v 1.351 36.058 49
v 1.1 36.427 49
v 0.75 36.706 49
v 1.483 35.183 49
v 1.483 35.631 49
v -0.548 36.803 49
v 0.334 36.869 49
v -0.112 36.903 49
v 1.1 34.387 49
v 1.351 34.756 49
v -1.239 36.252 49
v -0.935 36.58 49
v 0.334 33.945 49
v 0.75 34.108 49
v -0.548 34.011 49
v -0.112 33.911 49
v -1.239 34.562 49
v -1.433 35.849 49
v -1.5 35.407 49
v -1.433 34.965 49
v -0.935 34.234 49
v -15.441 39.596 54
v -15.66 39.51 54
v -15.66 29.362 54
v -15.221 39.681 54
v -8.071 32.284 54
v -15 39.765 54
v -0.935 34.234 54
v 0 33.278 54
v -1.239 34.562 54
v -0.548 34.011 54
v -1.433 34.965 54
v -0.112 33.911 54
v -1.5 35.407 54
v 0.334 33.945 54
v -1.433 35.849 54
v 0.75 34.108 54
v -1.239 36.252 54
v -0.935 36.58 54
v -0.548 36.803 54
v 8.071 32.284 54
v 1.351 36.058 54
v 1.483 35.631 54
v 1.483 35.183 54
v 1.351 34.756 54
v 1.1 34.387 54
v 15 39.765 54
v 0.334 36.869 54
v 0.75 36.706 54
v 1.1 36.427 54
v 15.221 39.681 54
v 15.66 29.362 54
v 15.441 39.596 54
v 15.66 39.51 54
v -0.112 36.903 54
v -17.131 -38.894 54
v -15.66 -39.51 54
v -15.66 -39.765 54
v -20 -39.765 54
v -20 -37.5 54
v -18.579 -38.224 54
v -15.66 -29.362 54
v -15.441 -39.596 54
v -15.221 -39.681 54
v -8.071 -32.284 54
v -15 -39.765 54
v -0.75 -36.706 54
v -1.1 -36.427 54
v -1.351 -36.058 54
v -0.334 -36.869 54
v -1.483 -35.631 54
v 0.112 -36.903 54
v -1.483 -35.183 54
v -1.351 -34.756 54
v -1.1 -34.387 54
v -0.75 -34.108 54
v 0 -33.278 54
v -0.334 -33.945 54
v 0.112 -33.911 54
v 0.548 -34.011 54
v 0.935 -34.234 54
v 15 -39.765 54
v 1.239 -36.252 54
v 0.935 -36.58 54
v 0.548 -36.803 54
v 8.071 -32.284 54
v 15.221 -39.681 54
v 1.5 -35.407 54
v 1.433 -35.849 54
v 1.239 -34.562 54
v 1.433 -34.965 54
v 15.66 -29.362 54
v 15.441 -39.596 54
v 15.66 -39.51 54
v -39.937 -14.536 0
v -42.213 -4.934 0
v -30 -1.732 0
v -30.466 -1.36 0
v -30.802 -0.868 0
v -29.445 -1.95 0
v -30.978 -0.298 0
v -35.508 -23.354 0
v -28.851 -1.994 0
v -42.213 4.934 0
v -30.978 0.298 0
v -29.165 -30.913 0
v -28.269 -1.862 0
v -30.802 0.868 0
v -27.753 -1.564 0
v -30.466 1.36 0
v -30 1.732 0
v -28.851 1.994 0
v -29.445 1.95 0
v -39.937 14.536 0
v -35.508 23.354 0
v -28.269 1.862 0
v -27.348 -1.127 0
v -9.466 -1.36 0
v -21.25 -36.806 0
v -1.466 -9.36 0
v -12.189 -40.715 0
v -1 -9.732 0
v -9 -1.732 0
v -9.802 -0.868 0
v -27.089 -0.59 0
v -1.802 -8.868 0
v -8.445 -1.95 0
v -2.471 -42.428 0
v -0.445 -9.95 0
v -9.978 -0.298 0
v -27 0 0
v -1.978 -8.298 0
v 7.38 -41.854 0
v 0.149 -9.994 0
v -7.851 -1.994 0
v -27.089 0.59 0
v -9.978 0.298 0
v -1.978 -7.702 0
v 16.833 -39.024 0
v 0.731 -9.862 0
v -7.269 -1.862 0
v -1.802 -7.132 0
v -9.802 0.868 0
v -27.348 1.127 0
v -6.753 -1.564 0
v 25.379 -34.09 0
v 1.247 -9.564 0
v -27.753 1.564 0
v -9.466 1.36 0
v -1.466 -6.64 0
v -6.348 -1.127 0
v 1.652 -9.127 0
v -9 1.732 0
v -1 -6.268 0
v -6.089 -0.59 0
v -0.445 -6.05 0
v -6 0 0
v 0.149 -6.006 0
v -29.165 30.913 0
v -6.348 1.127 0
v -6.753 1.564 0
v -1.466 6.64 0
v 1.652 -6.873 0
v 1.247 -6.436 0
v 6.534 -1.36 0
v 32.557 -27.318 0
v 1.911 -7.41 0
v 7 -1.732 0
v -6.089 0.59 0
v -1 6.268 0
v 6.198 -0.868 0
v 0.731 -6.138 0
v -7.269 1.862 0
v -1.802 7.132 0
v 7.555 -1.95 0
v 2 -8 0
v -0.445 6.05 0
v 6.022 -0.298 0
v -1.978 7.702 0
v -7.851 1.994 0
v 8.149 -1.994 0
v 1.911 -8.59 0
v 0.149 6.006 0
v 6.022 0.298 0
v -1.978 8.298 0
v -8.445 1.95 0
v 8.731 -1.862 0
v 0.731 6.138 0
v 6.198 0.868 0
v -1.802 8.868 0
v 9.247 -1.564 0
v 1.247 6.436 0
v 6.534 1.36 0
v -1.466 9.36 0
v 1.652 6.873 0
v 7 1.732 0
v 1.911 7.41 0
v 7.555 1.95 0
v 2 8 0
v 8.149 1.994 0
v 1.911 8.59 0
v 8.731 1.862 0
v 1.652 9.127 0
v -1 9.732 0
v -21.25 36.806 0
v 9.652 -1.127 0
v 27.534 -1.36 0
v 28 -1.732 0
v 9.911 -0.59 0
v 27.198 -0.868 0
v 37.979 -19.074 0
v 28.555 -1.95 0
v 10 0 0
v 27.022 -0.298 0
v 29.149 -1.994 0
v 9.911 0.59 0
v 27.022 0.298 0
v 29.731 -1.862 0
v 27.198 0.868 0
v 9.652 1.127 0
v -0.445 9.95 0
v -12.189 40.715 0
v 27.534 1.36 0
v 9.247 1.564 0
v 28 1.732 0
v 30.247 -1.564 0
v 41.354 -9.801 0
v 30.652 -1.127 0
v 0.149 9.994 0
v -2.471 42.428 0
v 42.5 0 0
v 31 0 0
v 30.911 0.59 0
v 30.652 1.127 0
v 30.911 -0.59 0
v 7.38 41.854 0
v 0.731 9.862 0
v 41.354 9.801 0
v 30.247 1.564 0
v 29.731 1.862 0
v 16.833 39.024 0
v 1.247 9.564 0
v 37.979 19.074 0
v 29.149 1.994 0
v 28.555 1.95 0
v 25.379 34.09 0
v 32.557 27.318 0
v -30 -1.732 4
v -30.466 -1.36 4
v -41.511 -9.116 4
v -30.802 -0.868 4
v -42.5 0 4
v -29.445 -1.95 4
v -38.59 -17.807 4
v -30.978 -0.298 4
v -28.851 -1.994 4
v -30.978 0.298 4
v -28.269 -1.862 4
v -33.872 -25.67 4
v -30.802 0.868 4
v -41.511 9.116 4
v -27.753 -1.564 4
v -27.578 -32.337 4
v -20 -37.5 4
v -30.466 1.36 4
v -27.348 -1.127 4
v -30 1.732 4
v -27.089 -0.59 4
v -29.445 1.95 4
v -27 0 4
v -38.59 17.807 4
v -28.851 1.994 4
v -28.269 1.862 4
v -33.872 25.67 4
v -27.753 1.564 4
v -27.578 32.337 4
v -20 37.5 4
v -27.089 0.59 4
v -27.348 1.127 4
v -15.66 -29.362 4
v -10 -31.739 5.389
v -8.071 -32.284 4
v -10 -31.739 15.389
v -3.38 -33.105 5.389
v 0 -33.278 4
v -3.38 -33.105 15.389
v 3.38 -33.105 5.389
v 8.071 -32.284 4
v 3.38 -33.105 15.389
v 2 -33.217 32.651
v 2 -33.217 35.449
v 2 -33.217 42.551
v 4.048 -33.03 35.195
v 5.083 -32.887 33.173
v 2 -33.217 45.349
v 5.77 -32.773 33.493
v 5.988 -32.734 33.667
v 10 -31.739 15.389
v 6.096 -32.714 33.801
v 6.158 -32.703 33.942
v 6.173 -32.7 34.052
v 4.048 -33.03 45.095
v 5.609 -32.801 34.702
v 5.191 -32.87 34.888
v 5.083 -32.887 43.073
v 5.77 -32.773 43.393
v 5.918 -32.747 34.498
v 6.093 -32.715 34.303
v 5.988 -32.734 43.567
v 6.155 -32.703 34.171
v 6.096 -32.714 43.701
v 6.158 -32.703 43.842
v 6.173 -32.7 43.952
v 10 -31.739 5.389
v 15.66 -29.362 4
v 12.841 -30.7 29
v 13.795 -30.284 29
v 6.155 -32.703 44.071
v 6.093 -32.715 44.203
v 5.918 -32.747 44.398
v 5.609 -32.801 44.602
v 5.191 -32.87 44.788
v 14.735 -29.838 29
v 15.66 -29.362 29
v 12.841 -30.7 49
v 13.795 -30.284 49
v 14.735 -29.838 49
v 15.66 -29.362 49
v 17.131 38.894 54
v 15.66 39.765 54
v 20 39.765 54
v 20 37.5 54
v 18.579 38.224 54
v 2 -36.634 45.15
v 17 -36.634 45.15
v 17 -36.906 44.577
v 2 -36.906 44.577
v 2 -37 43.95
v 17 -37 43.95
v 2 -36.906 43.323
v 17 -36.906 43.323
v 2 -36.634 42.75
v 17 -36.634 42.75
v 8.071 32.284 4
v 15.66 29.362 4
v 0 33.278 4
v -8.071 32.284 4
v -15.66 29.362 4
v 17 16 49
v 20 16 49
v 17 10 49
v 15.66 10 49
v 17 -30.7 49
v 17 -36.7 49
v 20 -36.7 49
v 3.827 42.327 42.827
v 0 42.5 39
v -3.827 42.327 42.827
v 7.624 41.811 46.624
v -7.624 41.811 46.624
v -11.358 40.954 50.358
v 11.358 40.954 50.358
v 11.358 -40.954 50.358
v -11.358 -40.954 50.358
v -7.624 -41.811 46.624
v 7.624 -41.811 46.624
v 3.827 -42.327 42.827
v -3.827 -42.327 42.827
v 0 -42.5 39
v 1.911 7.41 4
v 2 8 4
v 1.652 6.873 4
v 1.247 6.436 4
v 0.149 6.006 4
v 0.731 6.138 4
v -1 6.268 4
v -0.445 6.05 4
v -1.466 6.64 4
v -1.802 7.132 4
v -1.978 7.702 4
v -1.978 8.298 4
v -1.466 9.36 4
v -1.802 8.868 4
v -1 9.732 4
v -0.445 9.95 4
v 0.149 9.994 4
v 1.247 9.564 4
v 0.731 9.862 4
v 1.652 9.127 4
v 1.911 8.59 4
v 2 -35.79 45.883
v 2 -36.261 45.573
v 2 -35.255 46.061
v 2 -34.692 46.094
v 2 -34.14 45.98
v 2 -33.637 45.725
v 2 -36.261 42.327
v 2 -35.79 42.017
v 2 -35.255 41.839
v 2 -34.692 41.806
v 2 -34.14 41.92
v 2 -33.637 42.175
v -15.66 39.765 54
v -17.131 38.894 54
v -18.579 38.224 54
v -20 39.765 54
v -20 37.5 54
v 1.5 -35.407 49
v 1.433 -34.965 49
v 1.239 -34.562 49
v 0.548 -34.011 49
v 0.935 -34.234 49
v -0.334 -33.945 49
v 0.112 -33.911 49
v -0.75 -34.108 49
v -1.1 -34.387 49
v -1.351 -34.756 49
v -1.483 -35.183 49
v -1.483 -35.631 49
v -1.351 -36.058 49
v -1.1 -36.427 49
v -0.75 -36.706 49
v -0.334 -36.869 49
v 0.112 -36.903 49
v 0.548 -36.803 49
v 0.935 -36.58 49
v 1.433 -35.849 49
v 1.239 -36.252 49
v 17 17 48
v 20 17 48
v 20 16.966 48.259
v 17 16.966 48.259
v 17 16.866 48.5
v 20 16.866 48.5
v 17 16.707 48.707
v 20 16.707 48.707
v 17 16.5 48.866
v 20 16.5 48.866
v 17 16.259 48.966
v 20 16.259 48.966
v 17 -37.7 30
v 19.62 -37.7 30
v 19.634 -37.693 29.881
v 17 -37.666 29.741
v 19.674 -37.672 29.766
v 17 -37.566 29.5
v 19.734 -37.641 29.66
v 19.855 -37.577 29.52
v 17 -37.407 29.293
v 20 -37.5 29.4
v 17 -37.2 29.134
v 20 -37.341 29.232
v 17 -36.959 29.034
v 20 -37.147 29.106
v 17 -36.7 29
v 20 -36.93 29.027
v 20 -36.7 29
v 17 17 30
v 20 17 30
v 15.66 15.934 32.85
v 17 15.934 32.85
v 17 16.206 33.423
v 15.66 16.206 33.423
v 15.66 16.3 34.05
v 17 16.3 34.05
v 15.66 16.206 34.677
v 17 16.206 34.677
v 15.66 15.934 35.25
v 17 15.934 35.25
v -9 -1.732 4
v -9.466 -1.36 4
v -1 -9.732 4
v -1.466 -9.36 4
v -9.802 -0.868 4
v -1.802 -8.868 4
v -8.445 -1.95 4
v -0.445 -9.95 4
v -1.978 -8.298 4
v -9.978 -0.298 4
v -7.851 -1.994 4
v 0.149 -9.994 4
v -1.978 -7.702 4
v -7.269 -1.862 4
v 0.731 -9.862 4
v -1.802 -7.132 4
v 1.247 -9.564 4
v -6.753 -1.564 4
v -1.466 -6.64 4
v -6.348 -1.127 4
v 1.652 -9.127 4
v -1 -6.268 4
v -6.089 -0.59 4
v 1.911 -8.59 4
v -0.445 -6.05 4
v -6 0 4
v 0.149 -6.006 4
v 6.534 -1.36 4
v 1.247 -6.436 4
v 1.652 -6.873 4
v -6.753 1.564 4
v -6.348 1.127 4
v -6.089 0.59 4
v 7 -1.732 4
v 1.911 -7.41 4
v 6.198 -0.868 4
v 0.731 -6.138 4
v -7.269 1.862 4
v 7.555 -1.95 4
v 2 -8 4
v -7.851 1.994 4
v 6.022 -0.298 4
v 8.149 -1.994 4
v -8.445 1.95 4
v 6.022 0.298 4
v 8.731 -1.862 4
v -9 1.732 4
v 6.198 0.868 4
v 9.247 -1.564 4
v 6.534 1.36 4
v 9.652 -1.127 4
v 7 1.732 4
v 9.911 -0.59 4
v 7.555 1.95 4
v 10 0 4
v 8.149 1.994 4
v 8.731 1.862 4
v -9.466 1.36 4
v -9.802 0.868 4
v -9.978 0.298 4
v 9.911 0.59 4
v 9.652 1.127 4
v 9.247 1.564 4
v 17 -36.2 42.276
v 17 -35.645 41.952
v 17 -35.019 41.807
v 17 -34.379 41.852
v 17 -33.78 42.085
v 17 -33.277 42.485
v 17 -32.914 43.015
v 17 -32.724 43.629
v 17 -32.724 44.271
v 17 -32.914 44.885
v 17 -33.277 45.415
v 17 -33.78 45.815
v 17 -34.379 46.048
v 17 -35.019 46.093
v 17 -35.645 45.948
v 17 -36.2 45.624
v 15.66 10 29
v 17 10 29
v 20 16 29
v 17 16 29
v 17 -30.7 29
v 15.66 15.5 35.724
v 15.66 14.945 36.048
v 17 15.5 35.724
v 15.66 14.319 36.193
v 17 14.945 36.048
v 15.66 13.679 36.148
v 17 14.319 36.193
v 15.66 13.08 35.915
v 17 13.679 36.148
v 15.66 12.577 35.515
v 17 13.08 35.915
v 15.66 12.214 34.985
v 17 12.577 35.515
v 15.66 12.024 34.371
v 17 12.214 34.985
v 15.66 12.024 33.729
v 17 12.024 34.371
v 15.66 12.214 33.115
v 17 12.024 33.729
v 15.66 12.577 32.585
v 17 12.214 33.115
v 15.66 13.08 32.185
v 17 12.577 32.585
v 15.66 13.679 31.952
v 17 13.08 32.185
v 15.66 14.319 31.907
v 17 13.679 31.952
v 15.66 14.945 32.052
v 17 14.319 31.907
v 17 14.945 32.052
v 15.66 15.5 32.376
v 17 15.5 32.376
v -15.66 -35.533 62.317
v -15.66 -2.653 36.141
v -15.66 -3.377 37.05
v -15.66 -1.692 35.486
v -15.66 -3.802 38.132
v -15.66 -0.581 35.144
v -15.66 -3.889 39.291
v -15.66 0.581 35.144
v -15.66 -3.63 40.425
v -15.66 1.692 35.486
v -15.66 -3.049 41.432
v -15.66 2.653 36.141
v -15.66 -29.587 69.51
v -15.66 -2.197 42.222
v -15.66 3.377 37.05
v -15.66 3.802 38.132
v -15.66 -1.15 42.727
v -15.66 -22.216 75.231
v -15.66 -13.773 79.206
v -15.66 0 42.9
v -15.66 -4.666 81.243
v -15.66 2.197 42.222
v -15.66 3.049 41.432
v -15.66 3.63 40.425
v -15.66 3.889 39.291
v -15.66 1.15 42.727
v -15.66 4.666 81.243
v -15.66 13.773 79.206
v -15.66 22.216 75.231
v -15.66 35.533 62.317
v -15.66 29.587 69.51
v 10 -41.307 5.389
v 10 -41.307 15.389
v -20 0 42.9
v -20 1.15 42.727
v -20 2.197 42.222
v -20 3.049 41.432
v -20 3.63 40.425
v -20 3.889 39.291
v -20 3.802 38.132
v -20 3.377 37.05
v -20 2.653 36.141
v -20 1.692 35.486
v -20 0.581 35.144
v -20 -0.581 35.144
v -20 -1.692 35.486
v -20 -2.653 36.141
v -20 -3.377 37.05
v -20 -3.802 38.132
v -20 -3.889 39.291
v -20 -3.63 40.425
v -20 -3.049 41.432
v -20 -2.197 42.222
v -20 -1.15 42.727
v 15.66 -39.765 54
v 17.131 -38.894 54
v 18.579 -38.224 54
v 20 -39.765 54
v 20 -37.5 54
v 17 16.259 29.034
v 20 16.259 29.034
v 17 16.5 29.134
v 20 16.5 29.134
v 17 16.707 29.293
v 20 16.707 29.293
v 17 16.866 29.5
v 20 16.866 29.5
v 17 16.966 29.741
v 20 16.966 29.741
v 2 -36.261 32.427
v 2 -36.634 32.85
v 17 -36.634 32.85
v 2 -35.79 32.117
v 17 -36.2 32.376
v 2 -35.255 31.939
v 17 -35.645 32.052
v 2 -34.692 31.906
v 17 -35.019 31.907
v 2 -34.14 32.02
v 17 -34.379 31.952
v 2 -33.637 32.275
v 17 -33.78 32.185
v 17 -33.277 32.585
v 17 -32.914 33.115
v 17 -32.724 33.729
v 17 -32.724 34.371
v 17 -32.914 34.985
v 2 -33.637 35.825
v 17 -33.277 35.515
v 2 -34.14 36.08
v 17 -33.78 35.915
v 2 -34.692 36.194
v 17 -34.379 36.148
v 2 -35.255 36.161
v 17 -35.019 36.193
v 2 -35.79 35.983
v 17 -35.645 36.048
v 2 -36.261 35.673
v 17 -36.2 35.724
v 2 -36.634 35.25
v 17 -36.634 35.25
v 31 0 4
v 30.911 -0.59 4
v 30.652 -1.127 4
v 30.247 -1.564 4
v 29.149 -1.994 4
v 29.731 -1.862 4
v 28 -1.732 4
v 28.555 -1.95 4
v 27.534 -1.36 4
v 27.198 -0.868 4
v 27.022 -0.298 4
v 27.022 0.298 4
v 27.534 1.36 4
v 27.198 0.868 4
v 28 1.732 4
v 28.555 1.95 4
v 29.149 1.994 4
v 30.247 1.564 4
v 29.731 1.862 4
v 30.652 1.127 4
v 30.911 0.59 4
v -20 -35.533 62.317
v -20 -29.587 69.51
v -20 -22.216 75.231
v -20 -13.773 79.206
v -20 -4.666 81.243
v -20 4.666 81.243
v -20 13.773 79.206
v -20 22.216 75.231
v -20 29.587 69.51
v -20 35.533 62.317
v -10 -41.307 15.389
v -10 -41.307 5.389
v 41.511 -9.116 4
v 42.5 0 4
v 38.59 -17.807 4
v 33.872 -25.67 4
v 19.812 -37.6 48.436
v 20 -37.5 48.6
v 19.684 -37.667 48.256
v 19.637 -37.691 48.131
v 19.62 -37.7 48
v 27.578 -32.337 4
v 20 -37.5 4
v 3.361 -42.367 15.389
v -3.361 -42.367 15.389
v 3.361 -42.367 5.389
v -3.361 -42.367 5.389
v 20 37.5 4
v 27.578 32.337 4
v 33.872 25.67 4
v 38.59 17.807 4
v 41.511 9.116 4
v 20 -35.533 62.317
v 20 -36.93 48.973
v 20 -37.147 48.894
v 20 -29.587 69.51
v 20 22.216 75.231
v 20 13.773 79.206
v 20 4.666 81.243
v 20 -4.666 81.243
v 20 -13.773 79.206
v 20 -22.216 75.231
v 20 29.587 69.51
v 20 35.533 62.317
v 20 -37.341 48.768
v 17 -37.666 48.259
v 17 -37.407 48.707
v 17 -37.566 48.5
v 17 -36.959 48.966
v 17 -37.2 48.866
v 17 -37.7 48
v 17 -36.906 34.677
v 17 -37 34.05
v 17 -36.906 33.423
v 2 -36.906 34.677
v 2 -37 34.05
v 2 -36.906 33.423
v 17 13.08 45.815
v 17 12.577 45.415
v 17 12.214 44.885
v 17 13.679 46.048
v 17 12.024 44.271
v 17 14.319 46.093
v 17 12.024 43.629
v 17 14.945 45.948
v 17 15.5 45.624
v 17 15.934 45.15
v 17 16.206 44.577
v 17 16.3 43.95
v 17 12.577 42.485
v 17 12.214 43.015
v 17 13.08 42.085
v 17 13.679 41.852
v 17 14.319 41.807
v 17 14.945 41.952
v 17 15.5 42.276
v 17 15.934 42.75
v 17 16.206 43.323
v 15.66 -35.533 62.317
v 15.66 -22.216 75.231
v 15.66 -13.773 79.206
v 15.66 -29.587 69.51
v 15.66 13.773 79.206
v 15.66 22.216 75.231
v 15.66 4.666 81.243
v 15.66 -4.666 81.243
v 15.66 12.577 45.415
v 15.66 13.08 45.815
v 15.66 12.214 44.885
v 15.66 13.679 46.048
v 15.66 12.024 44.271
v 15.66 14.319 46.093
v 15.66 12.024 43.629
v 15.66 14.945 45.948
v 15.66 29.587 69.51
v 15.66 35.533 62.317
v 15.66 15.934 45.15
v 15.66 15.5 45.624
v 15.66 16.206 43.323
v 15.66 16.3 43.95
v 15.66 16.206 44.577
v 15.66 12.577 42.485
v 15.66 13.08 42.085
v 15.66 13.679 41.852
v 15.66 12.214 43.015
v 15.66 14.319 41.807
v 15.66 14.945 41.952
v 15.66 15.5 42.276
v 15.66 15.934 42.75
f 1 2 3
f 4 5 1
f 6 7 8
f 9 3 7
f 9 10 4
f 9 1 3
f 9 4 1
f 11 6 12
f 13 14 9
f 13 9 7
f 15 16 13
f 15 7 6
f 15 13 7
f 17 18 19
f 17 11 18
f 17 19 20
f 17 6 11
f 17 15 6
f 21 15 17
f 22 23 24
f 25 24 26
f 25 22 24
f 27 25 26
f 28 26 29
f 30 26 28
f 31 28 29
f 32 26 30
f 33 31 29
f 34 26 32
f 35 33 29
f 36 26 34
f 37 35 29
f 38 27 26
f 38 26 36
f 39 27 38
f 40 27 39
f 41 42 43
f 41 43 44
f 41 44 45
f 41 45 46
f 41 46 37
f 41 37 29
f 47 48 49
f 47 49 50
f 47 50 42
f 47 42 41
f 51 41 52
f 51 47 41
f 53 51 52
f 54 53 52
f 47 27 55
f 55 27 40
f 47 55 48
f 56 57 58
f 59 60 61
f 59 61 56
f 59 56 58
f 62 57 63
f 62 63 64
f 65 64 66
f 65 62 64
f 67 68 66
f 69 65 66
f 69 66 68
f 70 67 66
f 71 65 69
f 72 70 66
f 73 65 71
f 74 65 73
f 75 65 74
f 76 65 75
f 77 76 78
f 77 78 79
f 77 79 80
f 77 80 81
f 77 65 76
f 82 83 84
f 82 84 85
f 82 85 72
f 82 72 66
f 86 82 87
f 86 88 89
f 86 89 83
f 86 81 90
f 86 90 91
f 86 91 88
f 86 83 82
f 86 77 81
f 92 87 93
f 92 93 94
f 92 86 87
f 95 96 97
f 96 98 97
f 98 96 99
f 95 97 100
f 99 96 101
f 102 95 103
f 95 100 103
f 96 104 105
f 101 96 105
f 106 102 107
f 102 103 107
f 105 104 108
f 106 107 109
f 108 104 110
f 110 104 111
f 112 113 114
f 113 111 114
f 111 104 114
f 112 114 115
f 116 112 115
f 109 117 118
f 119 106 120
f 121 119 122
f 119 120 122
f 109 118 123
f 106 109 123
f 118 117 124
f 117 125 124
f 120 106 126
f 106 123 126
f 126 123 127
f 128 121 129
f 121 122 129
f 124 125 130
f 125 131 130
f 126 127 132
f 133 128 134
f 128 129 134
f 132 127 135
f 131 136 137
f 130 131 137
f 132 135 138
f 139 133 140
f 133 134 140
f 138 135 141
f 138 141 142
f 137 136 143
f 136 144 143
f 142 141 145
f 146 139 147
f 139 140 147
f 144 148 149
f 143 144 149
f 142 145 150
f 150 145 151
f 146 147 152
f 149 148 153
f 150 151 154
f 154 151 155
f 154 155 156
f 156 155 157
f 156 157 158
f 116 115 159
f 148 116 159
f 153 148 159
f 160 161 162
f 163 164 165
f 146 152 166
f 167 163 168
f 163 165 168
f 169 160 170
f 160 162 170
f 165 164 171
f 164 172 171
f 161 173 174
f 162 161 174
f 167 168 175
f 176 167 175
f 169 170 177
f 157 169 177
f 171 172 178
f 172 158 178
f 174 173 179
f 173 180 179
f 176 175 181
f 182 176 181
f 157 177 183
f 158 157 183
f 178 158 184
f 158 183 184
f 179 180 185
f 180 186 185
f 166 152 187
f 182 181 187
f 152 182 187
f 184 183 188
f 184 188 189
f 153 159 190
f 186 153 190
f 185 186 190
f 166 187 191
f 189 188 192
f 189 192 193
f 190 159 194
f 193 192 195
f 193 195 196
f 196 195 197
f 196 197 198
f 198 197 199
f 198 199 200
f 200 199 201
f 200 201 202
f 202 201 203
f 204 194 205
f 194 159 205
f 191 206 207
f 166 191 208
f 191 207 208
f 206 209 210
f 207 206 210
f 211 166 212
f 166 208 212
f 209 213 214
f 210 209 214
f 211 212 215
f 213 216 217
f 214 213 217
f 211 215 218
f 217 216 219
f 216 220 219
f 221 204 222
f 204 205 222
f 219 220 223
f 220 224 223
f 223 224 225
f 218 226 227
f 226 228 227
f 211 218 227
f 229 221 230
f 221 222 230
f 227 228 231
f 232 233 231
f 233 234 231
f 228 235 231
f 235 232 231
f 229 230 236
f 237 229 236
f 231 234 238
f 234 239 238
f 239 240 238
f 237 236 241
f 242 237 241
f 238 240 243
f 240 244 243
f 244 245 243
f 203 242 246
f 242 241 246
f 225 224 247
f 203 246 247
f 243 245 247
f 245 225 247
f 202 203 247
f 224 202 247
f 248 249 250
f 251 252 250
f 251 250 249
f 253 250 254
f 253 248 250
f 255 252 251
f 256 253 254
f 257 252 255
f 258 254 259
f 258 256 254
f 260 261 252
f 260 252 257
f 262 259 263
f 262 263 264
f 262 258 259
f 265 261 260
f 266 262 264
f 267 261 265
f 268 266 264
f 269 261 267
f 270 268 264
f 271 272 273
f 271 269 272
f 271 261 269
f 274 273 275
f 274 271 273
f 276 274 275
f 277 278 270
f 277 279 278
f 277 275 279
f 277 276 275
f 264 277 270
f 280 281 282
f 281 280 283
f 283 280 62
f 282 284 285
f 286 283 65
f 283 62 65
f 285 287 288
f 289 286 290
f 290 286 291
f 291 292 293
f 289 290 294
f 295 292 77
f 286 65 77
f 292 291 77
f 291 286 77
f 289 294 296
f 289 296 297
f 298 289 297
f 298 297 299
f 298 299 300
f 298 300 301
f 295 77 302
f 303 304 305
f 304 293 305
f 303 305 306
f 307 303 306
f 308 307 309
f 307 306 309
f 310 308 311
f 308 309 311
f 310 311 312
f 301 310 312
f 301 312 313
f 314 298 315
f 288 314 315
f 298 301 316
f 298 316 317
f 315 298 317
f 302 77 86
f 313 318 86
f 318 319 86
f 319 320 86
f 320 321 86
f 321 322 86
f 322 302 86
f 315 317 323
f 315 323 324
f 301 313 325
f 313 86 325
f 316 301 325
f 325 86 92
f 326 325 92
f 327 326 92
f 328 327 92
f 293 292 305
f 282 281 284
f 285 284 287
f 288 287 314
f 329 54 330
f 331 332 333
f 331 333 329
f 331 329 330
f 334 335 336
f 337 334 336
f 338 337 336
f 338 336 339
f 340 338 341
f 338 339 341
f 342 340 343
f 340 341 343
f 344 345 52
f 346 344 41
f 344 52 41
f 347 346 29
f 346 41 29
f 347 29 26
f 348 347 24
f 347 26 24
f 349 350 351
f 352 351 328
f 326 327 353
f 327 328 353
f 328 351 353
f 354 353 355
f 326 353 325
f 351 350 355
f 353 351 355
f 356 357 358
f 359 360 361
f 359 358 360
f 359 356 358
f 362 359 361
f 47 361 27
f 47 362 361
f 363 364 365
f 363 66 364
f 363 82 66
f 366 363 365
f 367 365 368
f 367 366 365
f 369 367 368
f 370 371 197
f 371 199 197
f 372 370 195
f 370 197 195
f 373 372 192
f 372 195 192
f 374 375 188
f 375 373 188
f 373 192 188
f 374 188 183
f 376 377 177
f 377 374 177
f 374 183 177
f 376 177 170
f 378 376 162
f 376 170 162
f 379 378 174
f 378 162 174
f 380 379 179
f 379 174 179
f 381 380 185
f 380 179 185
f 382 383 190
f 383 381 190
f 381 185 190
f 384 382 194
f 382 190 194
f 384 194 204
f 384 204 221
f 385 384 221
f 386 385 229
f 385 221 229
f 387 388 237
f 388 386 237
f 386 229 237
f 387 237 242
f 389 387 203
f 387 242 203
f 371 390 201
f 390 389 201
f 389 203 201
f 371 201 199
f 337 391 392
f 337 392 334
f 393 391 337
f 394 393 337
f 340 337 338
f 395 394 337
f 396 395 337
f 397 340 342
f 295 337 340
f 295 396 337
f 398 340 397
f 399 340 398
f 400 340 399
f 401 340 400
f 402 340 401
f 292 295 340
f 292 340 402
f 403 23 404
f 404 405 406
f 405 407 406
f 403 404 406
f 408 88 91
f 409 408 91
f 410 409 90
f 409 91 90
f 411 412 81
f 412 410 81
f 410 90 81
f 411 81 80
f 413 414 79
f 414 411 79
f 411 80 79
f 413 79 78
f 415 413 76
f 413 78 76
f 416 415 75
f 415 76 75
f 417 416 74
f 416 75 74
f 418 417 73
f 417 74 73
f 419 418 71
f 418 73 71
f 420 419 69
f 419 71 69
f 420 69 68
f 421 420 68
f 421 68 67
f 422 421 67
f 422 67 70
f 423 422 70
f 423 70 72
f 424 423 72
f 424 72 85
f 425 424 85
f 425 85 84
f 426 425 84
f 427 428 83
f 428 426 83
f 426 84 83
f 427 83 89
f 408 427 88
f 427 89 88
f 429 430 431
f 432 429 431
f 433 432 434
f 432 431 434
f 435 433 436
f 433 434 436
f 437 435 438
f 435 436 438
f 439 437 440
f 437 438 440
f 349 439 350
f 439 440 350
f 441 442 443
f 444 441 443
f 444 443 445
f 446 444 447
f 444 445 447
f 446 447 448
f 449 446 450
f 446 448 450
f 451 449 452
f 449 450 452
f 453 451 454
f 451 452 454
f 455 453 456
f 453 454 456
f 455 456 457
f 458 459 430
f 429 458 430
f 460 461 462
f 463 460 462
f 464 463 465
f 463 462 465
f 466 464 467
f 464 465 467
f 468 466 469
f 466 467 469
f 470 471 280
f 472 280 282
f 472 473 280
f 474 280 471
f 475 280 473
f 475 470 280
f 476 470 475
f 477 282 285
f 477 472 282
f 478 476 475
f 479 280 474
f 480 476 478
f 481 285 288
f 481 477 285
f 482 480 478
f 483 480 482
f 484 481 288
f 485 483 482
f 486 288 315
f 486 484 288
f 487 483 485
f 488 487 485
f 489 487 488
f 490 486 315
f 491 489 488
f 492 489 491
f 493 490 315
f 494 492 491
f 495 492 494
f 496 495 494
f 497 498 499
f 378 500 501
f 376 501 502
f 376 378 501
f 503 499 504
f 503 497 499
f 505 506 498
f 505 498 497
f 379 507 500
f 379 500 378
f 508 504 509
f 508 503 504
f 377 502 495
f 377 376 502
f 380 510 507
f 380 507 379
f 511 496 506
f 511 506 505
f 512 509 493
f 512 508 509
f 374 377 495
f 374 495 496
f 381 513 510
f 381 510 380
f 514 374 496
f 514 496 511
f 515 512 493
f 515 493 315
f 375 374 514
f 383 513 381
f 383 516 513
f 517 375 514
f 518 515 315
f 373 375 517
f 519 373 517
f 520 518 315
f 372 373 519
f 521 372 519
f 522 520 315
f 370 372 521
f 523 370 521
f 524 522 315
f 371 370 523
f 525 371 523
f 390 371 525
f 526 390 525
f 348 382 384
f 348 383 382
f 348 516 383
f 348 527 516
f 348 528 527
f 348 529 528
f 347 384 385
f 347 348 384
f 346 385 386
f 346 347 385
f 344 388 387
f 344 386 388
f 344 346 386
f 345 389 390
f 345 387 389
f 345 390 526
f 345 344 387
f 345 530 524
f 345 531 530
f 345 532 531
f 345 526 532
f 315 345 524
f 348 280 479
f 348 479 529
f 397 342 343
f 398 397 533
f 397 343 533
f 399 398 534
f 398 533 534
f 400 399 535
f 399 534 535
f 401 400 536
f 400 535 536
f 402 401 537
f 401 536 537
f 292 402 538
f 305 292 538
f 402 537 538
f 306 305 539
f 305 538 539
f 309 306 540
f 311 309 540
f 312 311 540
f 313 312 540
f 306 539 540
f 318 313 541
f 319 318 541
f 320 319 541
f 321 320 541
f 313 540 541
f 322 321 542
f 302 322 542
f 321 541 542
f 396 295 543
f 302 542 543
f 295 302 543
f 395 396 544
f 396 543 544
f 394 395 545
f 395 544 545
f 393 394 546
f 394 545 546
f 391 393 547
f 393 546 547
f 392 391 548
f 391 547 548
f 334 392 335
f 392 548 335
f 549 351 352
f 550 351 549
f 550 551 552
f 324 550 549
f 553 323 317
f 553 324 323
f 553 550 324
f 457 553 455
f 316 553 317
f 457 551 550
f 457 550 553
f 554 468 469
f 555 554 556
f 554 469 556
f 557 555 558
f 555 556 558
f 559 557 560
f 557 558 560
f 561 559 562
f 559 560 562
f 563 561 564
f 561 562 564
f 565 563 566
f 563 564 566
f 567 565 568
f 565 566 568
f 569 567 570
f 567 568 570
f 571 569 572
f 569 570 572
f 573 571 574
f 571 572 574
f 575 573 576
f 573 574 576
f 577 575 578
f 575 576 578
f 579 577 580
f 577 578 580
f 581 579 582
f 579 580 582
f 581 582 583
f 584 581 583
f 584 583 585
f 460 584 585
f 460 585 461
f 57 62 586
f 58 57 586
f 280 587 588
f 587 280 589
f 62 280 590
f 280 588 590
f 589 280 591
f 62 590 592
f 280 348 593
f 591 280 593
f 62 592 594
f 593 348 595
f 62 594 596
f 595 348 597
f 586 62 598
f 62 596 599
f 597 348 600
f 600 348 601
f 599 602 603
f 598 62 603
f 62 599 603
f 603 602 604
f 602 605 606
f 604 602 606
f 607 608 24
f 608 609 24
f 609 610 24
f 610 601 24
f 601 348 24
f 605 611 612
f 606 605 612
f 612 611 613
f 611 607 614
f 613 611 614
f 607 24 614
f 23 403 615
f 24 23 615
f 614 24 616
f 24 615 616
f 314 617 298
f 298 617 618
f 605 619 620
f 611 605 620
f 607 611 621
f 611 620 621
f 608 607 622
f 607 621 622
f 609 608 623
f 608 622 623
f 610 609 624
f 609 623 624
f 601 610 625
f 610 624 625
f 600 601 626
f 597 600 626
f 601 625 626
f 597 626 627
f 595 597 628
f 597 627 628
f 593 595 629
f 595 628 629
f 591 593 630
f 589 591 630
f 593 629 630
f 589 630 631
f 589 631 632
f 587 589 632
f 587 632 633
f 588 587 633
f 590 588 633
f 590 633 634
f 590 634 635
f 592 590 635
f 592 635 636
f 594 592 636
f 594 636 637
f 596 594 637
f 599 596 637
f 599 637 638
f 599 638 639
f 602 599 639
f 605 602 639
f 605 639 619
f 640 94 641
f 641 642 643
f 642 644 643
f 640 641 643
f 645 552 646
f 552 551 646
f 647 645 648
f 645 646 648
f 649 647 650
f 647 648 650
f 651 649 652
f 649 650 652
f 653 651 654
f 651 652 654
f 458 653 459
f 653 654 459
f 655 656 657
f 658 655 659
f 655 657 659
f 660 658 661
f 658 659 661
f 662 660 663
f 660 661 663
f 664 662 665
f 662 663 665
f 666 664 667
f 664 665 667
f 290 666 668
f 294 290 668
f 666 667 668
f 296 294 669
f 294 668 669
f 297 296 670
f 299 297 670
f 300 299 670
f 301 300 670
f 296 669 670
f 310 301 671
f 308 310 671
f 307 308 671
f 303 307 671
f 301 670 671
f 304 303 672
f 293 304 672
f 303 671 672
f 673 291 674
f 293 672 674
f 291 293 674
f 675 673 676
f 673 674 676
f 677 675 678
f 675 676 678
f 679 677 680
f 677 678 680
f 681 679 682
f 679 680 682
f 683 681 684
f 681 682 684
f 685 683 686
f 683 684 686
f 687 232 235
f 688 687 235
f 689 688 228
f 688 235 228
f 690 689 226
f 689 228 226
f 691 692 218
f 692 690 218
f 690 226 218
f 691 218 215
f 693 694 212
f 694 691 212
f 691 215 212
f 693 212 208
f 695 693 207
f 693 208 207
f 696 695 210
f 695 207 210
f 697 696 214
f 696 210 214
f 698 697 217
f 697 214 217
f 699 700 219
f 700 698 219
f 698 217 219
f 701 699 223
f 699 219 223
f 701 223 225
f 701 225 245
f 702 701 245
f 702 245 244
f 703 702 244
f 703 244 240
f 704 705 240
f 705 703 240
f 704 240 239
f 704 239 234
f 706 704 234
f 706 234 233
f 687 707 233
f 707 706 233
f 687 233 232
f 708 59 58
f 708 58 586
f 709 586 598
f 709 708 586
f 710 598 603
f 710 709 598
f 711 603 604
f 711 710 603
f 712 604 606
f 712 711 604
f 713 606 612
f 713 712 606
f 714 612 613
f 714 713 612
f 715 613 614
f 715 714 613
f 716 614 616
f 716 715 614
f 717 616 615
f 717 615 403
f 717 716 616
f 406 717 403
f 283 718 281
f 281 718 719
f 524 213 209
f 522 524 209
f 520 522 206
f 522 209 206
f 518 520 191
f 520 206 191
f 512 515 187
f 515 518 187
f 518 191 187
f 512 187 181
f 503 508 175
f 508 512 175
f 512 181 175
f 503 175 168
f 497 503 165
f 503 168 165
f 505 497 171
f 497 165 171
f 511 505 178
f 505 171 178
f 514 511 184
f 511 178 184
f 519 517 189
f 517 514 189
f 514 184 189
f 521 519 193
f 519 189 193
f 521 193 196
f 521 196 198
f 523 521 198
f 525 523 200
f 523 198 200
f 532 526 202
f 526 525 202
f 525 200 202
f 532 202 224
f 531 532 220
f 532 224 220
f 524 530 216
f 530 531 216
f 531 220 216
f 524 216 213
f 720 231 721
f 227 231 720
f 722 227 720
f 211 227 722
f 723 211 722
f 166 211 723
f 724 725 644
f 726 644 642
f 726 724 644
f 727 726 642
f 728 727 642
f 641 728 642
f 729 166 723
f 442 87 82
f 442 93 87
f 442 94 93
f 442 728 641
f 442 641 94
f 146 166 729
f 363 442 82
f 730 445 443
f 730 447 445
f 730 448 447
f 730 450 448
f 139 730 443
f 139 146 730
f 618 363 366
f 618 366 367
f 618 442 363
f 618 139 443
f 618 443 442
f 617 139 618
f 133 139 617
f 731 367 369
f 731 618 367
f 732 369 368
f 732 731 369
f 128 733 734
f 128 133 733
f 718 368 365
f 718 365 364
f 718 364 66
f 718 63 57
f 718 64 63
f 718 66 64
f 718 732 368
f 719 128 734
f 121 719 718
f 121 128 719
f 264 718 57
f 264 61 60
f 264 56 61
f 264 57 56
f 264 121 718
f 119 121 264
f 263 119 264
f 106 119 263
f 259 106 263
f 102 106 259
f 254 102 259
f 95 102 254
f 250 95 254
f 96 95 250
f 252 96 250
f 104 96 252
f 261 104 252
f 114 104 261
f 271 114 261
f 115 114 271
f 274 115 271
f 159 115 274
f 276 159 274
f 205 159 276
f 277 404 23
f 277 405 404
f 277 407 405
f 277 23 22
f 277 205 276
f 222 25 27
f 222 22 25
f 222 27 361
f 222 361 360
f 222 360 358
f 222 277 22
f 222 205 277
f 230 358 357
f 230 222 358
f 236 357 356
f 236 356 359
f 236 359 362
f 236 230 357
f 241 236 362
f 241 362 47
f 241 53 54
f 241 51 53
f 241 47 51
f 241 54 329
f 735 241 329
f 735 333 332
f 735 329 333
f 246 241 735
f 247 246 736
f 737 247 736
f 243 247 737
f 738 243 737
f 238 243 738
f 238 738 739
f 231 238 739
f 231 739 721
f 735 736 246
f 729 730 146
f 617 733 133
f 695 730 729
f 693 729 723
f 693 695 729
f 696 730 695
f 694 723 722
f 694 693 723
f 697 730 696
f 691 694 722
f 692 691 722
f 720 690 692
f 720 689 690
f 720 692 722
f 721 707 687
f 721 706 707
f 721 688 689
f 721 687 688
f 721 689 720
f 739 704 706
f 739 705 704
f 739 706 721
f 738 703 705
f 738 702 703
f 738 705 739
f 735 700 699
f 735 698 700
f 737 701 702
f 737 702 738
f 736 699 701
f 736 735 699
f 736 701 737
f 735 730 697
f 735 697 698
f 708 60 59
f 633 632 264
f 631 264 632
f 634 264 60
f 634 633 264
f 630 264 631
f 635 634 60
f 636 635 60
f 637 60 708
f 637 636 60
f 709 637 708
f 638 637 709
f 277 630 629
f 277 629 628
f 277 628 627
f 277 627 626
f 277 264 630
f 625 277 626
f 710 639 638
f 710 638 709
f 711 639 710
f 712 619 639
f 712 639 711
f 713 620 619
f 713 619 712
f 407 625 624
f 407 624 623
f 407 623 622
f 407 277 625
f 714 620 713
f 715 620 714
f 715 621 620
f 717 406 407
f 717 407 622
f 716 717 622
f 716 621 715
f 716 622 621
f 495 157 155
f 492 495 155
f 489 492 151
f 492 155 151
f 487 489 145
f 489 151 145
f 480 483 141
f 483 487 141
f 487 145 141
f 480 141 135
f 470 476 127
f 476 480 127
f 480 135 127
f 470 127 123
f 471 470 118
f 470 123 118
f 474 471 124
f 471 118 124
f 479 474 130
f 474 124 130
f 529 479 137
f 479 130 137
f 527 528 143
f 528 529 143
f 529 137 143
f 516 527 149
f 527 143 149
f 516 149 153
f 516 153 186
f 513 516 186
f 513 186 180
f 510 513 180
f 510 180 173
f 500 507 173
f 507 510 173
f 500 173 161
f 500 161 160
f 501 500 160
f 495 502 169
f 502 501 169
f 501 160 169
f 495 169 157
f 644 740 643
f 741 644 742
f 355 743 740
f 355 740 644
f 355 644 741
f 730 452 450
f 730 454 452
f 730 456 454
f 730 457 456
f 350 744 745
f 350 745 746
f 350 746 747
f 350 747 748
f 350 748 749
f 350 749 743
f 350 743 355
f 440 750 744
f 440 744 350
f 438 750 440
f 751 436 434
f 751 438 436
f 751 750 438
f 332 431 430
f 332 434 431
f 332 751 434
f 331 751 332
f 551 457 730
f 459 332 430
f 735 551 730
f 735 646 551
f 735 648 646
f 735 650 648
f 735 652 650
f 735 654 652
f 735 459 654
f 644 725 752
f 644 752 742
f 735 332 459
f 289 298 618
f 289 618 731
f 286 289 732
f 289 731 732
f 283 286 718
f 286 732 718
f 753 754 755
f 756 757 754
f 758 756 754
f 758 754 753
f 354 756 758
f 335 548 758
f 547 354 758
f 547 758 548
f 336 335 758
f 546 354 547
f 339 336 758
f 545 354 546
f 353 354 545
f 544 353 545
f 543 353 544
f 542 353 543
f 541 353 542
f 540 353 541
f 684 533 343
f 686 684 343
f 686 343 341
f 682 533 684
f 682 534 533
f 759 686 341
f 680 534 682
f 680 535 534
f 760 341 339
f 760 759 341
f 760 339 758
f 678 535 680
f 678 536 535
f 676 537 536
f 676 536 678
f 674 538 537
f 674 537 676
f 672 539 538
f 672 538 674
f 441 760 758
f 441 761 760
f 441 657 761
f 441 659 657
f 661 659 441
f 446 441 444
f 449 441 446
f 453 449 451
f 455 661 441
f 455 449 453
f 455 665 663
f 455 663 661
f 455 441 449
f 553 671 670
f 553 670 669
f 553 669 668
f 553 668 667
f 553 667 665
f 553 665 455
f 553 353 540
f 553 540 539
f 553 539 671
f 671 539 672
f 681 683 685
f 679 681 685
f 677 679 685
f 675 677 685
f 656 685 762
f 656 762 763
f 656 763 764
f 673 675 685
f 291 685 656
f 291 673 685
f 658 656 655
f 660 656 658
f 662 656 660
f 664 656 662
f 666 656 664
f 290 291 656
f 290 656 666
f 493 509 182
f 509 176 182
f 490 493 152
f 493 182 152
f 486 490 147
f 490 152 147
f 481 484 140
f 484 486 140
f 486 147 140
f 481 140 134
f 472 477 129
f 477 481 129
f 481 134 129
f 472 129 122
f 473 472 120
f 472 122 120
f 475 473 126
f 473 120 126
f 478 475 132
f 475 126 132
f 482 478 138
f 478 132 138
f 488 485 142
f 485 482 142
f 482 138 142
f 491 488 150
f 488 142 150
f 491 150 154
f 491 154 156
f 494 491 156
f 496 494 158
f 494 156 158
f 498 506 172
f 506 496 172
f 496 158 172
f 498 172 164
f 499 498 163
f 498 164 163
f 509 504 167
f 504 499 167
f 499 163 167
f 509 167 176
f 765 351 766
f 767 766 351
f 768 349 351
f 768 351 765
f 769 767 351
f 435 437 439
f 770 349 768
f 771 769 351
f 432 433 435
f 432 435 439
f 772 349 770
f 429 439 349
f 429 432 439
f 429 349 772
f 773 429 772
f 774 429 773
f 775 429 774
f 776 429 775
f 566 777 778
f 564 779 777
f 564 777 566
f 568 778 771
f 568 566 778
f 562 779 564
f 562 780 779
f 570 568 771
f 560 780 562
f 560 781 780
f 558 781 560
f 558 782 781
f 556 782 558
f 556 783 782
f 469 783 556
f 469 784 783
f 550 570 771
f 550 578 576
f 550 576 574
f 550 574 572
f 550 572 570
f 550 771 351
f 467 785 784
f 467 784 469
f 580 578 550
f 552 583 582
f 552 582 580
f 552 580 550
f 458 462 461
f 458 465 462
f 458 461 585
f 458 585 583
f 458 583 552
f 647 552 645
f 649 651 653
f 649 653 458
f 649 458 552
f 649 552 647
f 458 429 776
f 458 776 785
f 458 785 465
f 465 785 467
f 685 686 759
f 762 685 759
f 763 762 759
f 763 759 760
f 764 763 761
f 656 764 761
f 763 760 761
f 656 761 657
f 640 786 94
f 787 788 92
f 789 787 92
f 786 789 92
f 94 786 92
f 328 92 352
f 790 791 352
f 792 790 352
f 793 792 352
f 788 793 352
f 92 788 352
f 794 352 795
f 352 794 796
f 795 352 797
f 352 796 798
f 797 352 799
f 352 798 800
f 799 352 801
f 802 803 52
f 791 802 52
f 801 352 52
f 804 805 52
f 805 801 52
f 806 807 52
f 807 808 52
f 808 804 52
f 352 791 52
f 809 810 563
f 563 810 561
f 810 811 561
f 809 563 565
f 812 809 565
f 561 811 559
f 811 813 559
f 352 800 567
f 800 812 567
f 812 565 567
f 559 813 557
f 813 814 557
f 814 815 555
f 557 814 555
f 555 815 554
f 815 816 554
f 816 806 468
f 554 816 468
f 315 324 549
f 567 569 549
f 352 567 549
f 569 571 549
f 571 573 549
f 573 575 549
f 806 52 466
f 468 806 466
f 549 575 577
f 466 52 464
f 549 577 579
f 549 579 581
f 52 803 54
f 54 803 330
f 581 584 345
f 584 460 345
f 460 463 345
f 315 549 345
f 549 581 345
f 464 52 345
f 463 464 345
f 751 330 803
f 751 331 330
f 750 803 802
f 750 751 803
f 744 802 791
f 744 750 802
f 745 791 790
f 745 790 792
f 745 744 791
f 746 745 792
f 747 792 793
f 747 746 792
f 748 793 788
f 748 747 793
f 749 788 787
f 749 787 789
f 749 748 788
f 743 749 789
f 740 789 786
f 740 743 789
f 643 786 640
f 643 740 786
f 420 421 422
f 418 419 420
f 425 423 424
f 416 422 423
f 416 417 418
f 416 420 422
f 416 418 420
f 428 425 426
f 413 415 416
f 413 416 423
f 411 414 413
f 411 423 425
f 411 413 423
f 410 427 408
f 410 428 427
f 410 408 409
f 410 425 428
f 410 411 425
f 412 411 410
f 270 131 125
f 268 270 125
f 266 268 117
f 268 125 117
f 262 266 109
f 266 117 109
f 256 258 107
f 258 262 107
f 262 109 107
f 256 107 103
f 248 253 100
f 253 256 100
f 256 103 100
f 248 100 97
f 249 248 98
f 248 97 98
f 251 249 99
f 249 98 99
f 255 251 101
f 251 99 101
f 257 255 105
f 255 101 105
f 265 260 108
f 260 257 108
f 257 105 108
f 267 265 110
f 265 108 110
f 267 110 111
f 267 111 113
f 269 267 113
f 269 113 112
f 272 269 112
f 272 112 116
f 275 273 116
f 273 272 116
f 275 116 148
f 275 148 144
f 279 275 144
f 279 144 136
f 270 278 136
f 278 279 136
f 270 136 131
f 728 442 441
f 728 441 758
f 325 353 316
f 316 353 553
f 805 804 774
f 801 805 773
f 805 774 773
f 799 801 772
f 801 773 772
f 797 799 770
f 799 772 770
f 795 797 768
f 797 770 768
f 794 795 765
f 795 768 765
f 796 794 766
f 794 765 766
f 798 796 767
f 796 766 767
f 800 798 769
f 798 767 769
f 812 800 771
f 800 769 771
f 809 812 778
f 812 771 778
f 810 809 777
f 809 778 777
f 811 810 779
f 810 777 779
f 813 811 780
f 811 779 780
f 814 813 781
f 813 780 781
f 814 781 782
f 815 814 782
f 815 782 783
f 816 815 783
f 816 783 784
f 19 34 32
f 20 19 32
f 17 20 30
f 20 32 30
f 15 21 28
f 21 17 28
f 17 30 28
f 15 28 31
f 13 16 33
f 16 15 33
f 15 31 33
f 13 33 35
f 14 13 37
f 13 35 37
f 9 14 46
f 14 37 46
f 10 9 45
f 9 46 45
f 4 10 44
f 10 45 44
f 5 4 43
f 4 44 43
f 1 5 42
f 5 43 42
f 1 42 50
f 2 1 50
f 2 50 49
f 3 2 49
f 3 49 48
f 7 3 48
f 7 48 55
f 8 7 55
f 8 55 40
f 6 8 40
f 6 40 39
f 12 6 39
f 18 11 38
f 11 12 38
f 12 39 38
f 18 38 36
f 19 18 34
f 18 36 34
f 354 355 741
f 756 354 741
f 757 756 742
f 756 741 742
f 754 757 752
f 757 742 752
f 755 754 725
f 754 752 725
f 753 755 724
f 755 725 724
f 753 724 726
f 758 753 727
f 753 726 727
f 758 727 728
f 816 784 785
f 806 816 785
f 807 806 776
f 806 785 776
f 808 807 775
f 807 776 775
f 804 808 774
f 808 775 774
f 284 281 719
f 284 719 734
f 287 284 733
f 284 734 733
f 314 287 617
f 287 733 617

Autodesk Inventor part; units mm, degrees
ref_plane "YZ Plane" through (0, 0, 0) normal (1, 0, 0) x (0, 1, 0)
ref_plane "XZ Plane" through (0, 0, 0) normal (0, 1, 0) x (-1, 0, 0)
sketch "Эскиз1" plane through (0, 0, 0) normal (0, 0, 1) x (1, 0, 0)
  circle A0 centre (29, 0) radius 2
  circle A1 centre (-29, 0) radius 2
  circle A2 centre (0, 8) radius 2
  circle A3 centre (8, 0) radius 2
  circle A4 centre (0, -8) radius 2
  circle A5 centre (-8, 0) radius 2
  circle A6 centre (0, 0) radius 42.5
  circle A7 centre (29, 0) radius 2
  circle A8 centre (-29, 0) radius 2
  circle A9 centre (0, 8) radius 2
  circle A10 centre (8, 0) radius 2
  circle A11 centre (0, -8) radius 2
  circle A12 centre (-8, 0) radius 2
  circle A13 centre (0, 0) radius 42.5
extrude "Выдавливание1" add sketch "Эскиз1" along normal blind 4
sketch "Эскиз16" plane through (0, 0, 4) normal (0, 0, 1) x (1, 0, 0)
  line L0 (-20, -37.5) -> (-20, 37.5)
  line L1 (20, 37.5) -> (20, -37.5)
  line L2 (20, -42.5) -> (-20, 42.5) construction
  line L3 (-20, -42.5) -> (20, 42.5) construction
  circle A0 centre (0, 0) radius 42.5 projected
  arc A1 (-20, -37.5) -> (20, -37.5) centre (0, 0) ccw
  arc A2 (20, 37.5) -> (-20, 37.5) centre (0, 0) ccw
extrude "Выдавливание14" add sketch "Эскиз16" along normal blind 50 contours L0 A0 L1
sketch "Эскиз17" plane through (0, 0, 54) normal (0, 0, 1) x (1, 0, 0)
  line L0 (-15.66, -29.3625) -> (-15.66, 29.3625)
  line L1 (15.66, 29.3625) -> (15.66, -29.3625)
  line L2 (15.66, -33.2775) -> (-15.66, 33.2775) construction
  line L3 (-15.66, -33.2775) -> (15.66, 33.2775) construction
  arc A0 (-15.66, -29.3625) -> (15.66, -29.3625) centre (0, 0) ccw
  arc A1 (15.66, 29.3625) -> (-15.66, 29.3625) centre (0, 0) ccw
  arc A2 (-15.66, -29.3625) -> (15.66, -29.3625) centre (0, 0) ccw
  arc A3 (15.66, 29.3625) -> (-15.66, 29.3625) centre (0, 0) ccw
extrude "Выдавливание15" cut sketch "Эскиз17" against normal up to surface (50 mm away)
sketch "Эскиз23" plane through (-20, -37.5, 4) normal (-1, 0, 0) x (0, 0, 1)
  line L0 (0, 39.5) -> (0, 35.5) projected
  line L1 (0, 37.5) -> (35, 37.5)
  circle A0 centre (35, 37.5) radius 3.9
  point P0 (-4, 37.5)
  dimension "d73" = 35
  dimension "d74" = 7.8
extrude "Выдавливание21" cut sketch "Эскиз23" against normal blind 54
sketch "Эскиз26" plane through (20, -37.5, 4) normal (1, 0, 0) x (0, 0, -1)
  circle A0 centre (-35, 37.5) radius 3.9 projected
  line L0 (-45, 47.5) -> (-25, 47.5)
  line L1 (-25, 47.5) -> (-25, 53.5)
  arc A1 (-25, 53.5) -> (-26, 54.5) centre (-26, 53.5) ccw
  line L2 (-26, 54.5) -> (-28.85, 54.5)
  line L3 (-28.85, 54.5) -> (-28.85, 53.434)
  arc A2 (-31.25, 53.434) -> (-28.85, 53.434) centre (-30.05, 51.65) ccw
  line L4 (-31.25, 53.434) -> (-31.25, 54.5)
  line L5 (-31.25, 54.5) -> (-38.75, 54.5)
  line L6 (-38.75, 54.5) -> (-38.75, 53.434)
  arc A3 (-41.15, 53.434) -> (-38.75, 53.434) centre (-39.95, 51.65) ccw
  line L7 (-41.15, 53.434) -> (-41.15, 54.5)
  line L8 (-41.15, 54.5) -> (-44, 54.5)
  arc A4 (-44, 54.5) -> (-45, 53.5) centre (-44, 53.5) ccw
  line L9 (-45, 53.5) -> (-45, 47.5)
  line L10 (-38.75, -0.2) -> (-38.75, 0.866)
  line L11 (-31.25, -0.2) -> (-38.75, -0.2)
  line L12 (-31.25, 0.866) -> (-31.25, -0.2)
  arc A5 (-28.85, 0.866) -> (-31.25, 0.866) centre (-30.05, 2.65) ccw
  line L13 (-28.85, -0.2) -> (-28.85, 0.866)
  line L14 (-26, -0.2) -> (-28.85, -0.2)
  arc A6 (-26, -0.2) -> (-25, 0.8) centre (-26, 0.8) ccw
  line L15 (-25, 6.8) -> (-25, 0.8)
  line L16 (-45, 6.8) -> (-25, 6.8)
  line L17 (-45, 0.8) -> (-45, 6.8)
  arc A7 (-45, 0.8) -> (-44, -0.2) centre (-44, 0.8) ccw
  line L18 (-41.15, -0.2) -> (-44, -0.2)
  line L19 (-41.15, 0.866) -> (-41.15, -0.2)
  arc A8 (-38.75, 0.866) -> (-41.15, 0.866) centre (-39.95, 2.65) ccw
  line L20 (-25, 47.5) -> (-25, 6.8)
  line L21 (-45, 6.8) -> (-45, 47.5)
  line L22 (-45, 47.5) -> (-25, 47.5)
  circle A9 centre (-35, 37.5) radius 1.25
  circle A10 centre (-35, 37.5) radius 3.4957
  circle A11 centre (-35, 37.5) radius 2.6787
  circle A12 centre (-35, 37.5) radius 5.4
  line L23 (-28.85, -0.2) -> (-31.25, -0.2)
  line L24 (-38.75, -0.2) -> (-41.15, -0.2)
  line L25 (-31.25, -0.2) -> (-34.5, -0.2)
  line L26 (-31.25, 54.5) -> (-38.75, 54.5)
  line L27 (-28.85, 54.5) -> (-31.25, 54.5)
  line L28 (-31.25, 54.5) -> (-38.75, 54.5)
  line L29 (-38.75, 54.5) -> (-41.15, 54.5)
  circle A13 centre (-30.05, 51.65) radius 2.15
  circle A14 centre (-39.95, 51.65) radius 2.15
  arc A15 (-38.75, 0.866) -> (-41.15, 0.866) centre (-39.95, 2.65) ccw
  circle A16 centre (-39.95, 2.65) radius 2.15
  circle A17 centre (-30.05, 2.65) radius 2.15
  circle A18 centre (-35, 37.5) radius 42.5
  line L30 (4, 80) -> (-50, 80) projected
  line L31 (-50, 0) -> (-50, -5) projected
  line L32 (-50, -2.2649) -> (-50, -5)
  line L33 (4, -5) -> (-50, -5) projected
  line L34 (-35, -5) -> (-50, -5)
  line L35 (4, -5) -> (-50, -5) projected
  line L36 (-50, 80) -> (-50, 75) projected
  line L37 (-50, 77.2649) -> (-50, 80)
  line L38 (-50, 80) -> (-35, 80)
  line L39 (4, 80) -> (-50, 80) projected
  point P0 (4, 37.5)
  point P1 (-45, 27.15)
extrude "Выдавливание23" cut sketch "Эскиз26" against normal blind 10 contours A0 | L0 L20 L16 L21 | A9 | A10 | A11 | A12
sketch "Эскиз27" plane through (20, -37.5, 4) normal (1, 0, 0) x (0, 0, -1)
  circle A0 centre (-35, 37.5) radius 3.9
  line L0 (-45, 47.5) -> (-25, 47.5)
  line L1 (-25, 47.5) -> (-25, 53.5)
  arc A1 (-25, 53.5) -> (-26, 54.5) centre (-26, 53.5) ccw
  line L2 (-26, 54.5) -> (-28.85, 54.5)
  line L3 (-28.85, 54.5) -> (-28.85, 53.434)
  arc A2 (-31.25, 53.434) -> (-28.85, 53.434) centre (-30.05, 51.65) ccw
  line L4 (-31.25, 53.434) -> (-31.25, 54.5)
  line L5 (-31.25, 54.5) -> (-38.75, 54.5)
  line L6 (-38.75, 54.5) -> (-38.75, 53.434)
  arc A3 (-41.15, 53.434) -> (-38.75, 53.434) centre (-39.95, 51.65) ccw
  line L7 (-41.15, 53.434) -> (-41.15, 54.5)
  line L8 (-41.15, 54.5) -> (-44, 54.5)
  arc A4 (-44, 54.5) -> (-45, 53.5) centre (-44, 53.5) ccw
  line L9 (-45, 53.5) -> (-45, 47.5)
  line L10 (-38.75, -0.2) -> (-38.75, 0.866)
  line L11 (-31.25, -0.2) -> (-38.75, -0.2)
  line L12 (-31.25, 0.866) -> (-31.25, -0.2)
  arc A5 (-28.85, 0.866) -> (-31.25, 0.866) centre (-30.05, 2.65) ccw
  line L13 (-28.85, -0.2) -> (-28.85, 0.866)
  line L14 (-26, -0.2) -> (-28.85, -0.2)
  arc A6 (-26, -0.2) -> (-25, 0.8) centre (-26, 0.8) ccw
  line L15 (-25, 6.8) -> (-25, 0.8)
  line L16 (-45, 6.8) -> (-25, 6.8)
  line L17 (-45, 0.8) -> (-45, 6.8)
  arc A7 (-45, 0.8) -> (-44, -0.2) centre (-44, 0.8) ccw
  line L18 (-41.15, -0.2) -> (-44, -0.2)
  line L19 (-41.15, 0.866) -> (-41.15, -0.2)
  arc A8 (-38.75, 0.866) -> (-41.15, 0.866) centre (-39.95, 2.65) ccw
  line L20 (-25, 47.5) -> (-25, 6.8)
  line L21 (-45, 6.8) -> (-45, 47.5)
  line L22 (-45, 47.5) -> (-25, 47.5)
  circle A9 centre (-35, 37.5) radius 1.25
  circle A10 centre (-35, 37.5) radius 3.4957
  circle A11 centre (-35, 37.5) radius 2.6787
  circle A12 centre (-35, 37.5) radius 5.4
  line L23 (-28.85, -0.2) -> (-31.25, -0.2)
  line L24 (-38.75, -0.2) -> (-41.15, -0.2)
  line L25 (-31.25, -0.2) -> (-34.5, -0.2)
  line L26 (-31.25, 54.5) -> (-38.75, 54.5)
  line L27 (-28.85, 54.5) -> (-31.25, 54.5)
  line L28 (-31.25, 54.5) -> (-38.75, 54.5)
  line L29 (-38.75, 54.5) -> (-41.15, 54.5)
  circle A13 centre (-30.05, 51.65) radius 2.15
  circle A14 centre (-39.95, 51.65) radius 2.15
  arc A15 (-38.75, 0.866) -> (-41.15, 0.866) centre (-39.95, 2.65) ccw
  circle A16 centre (-39.95, 2.65) radius 2.15
  circle A17 centre (-30.05, 2.65) radius 2.15
  point P0 (4, 37.5)
  point P1 (4, 37.5)
  point P2 (-45, 27.15)
extrude "Выдавливание24" cut sketch "Эскиз27" against normal blind 3 contours L9 A4 L8 L7 A3 L6 L5 L4 A2 L3 L2 A1 L1 L0 | L16 L15 A6 L14 L13 A5 L12 L11 L10 A8 L19 L18 A7 L17 | L29 L6 A14 L7 | L3 A13 L4 L27 | A14 A3 | L19 A16 L10 L24 | A2 A13 | L23 L12 A17 L13 | A8 A16 | A17 A5
sketch "Эскиз28" plane through (17, -37.5, 4) normal (1, 0, 0) x (0, 0, -1)
  circle A0 centre (-35, 37.5) radius 3.9
  line L0 (-45, 47.5) -> (-25, 47.5)
  line L1 (-25, 47.5) -> (-25, 53.5)
  arc A1 (-25, 53.5) -> (-26, 54.5) centre (-26, 53.5) ccw
  line L2 (-26, 54.5) -> (-28.85, 54.5)
  line L3 (-28.85, 54.5) -> (-28.85, 53.434)
  arc A2 (-31.25, 53.434) -> (-28.85, 53.434) centre (-30.05, 51.65) ccw
  line L4 (-31.25, 53.434) -> (-31.25, 54.5)
  line L5 (-31.25, 54.5) -> (-38.75, 54.5)
  line L6 (-38.75, 54.5) -> (-38.75, 53.434)
  arc A3 (-41.15, 53.434) -> (-38.75, 53.434) centre (-39.95, 51.65) ccw
  line L7 (-41.15, 53.434) -> (-41.15, 54.5)
  line L8 (-41.15, 54.5) -> (-44, 54.5)
  arc A4 (-44, 54.5) -> (-45, 53.5) centre (-44, 53.5) ccw
  line L9 (-45, 53.5) -> (-45, 47.5)
  line L10 (-38.75, -0.2) -> (-38.75, 0.866)
  line L11 (-31.25, -0.2) -> (-38.75, -0.2)
  line L12 (-31.25, 0.866) -> (-31.25, -0.2)
  arc A5 (-28.85, 0.866) -> (-31.25, 0.866) centre (-30.05, 2.65) ccw
  line L13 (-28.85, -0.2) -> (-28.85, 0.866)
  line L14 (-26, -0.2) -> (-28.85, -0.2)
  arc A6 (-26, -0.2) -> (-25, 0.8) centre (-26, 0.8) ccw
  line L15 (-25, 6.8) -> (-25, 0.8)
  line L16 (-45, 6.8) -> (-25, 6.8)
  line L17 (-45, 0.8) -> (-45, 6.8)
  arc A7 (-45, 0.8) -> (-44, -0.2) centre (-44, 0.8) ccw
  line L18 (-41.15, -0.2) -> (-44, -0.2)
  line L19 (-41.15, 0.866) -> (-41.15, -0.2)
  arc A8 (-38.75, 0.866) -> (-41.15, 0.866) centre (-39.95, 2.65) ccw
  line L20 (-25, 47.5) -> (-25, 6.8)
  line L21 (-45, 6.8) -> (-45, 47.5)
  line L22 (-45, 47.5) -> (-25, 47.5)
  circle A9 centre (-35, 37.5) radius 1.25
  circle A10 centre (-35, 37.5) radius 3.4957
  circle A11 centre (-35, 37.5) radius 2.6787
  circle A12 centre (-35, 37.5) radius 5.4
  line L23 (-28.85, -0.2) -> (-31.25, -0.2)
  line L24 (-38.75, -0.2) -> (-41.15, -0.2)
  line L25 (-31.25, -0.2) -> (-34.5, -0.2)
  line L26 (-31.25, 54.5) -> (-38.75, 54.5)
  line L27 (-28.85, 54.5) -> (-31.25, 54.5)
  line L28 (-31.25, 54.5) -> (-38.75, 54.5)
  line L29 (-38.75, 54.5) -> (-41.15, 54.5)
  circle A13 centre (-30.05, 51.65) radius 2.15
  circle A14 centre (-39.95, 51.65) radius 2.15
  arc A15 (-38.75, 0.866) -> (-41.15, 0.866) centre (-39.95, 2.65) ccw
  circle A16 centre (-39.95, 2.65) radius 2.15
  circle A17 centre (-30.05, 2.65) radius 2.15
  point P0 (4, 37.5)
  point P1 (4, 37.5)
  point P2 (-45, 27.15)
extrude "Выдавливание25" cut sketch "Эскиз28" against normal blind 15 contours A14 A3 | A2 A13 | A8 A16 | A17 A5
sketch "Эскиз29" plane through (20, -37.5, 4) normal (1, 0, 0) x (0, 0, -1)
  circle A0 centre (-35, 37.5) radius 3.9 projected
  circle A1 centre (-35, 37.5) radius 42.5
  line L0 (4, 80) -> (-50, 80) projected
  line L1 (-50, -2.2649) -> (-50, -5)
  line L2 (-50, -5) -> (-35, -5)
  line L3 (4, -5) -> (-50, -5) projected
  line L4 (-50, 80) -> (-50, 75) projected
  line L5 (-50, 77.2649) -> (-50, 80)
  line L6 (-50, 80) -> (-35, 80)
  point P0 (4, 37.5)
extrude "Выдавливание26" cut sketch "Эскиз29" against normal blind 46.75 contours A1 L4 L0 | L2 L1 A1
sketch "Эскиз30" plane through (20, -37.5, 4) normal (1, 0, 0) x (0, 0, -1)
  circle A0 centre (-35, 37.5) radius 3.9 projected
  circle A1 centre (-35, 37.5) radius 42.5
  line L0 (-50, 0) -> (-50, -2.2649) projected
  line L1 (-50, -2.2649) -> (-50, 77.2649)
  line L2 (-50, 8.1375) -> (-50, 66.8625) projected
  point P0 (4, 37.5)
extrude "Выдавливание27" add sketch "Эскиз30" against normal up to surface (4.34 mm away) contours L1 L0 A1 picked at (-59.1667, 37.5)
sketch "Эскиз31" plane through (-20, -37.5, 4) normal (-1, 0, 0) x (0, 0, 1)
  circle A0 centre (35, 37.5) radius 3.9
  circle A1 centre (35, 37.5) radius 42.5
  line L0 (50, 75) -> (50, 77.2649)
  line L1 (50, 77.2649) -> (50, -2.2649)
  line L2 (50, 66.8625) -> (50, 8.1375)
  circle A2 centre (35, 37.5) radius 3.9 projected
  point P0 (-4, 37.5)
  point P1 (-4, 37.5)
extrude "Выдавливание28" add sketch "Эскиз31" against normal up to surface (4.34 mm away) contours A1 L1 L0 picked at (59.1667, 37.5)
sketch "Эскиз32" plane through (-20, -37.5, 4) normal (-1, 0, 0) x (0, 0, 1)
  circle A0 centre (35, 37.5) radius 3.9 projected
  line L0 (0, 0) -> (0, 75) projected
  line L1 (0, 0) -> (50, 0) projected
  line L2 (50, 0) -> (50, -2.2649) projected
  arc A1 (50, -2.2649) -> (50, 77.2649) centre (35, 37.5) ccw projected
  line L3 (50, 77.2649) -> (50, 75) projected
  line L4 (0, 75) -> (50, 75) projected
  point P0 (-4, 37.5)
ref_plane "РабПлоскость2" through (0, -42.5, 39) normal (0, -1, 0) x (1, 0, 0)
sketch "Эскиз33" plane through (0, -42.5, 39) normal (0, -1, 0) x (1, 0, 0)
  line L0 (-10, -33.6111) -> (10, -33.6111)
  line L1 (10, -33.6111) -> (10, -23.6111)
  line L2 (10, -23.6111) -> (-10, -23.6111)
  line L3 (-10, -23.6111) -> (-10, -33.6111)
  line L4 (-10, -33.6111) -> (10, -23.6111) construction
  line L5 (10, -33.6111) -> (-10, -23.6111) construction
  point P0 (0, -39)
  point P1 (0, -28.6111)
  dimension "d92" = 20
  dimension "d93" = 10
extrude "Выдавливание29" cut sketch "Эскиз33" against normal blind 18.75
sketch "Эскиз34" plane through (0, 0, 54) normal (0, 0, 1) x (1, 0, 0)
  line L0 (0, 0) -> (0, -35.407)
  circle A0 centre (0, -35.407) radius 1.5
  dimension "d96" = 35.407
  dimension "d97" = 3
extrude "Выдавливание30" cut sketch "Эскиз34" against normal blind 5
pattern_circular "Круговой массив1" count 2 over 360 about axis through (0, 0, 0) along (0, 0, 1) of "Выдавливание30"
properties part number "joint3_main" material "Пластик АБС"
